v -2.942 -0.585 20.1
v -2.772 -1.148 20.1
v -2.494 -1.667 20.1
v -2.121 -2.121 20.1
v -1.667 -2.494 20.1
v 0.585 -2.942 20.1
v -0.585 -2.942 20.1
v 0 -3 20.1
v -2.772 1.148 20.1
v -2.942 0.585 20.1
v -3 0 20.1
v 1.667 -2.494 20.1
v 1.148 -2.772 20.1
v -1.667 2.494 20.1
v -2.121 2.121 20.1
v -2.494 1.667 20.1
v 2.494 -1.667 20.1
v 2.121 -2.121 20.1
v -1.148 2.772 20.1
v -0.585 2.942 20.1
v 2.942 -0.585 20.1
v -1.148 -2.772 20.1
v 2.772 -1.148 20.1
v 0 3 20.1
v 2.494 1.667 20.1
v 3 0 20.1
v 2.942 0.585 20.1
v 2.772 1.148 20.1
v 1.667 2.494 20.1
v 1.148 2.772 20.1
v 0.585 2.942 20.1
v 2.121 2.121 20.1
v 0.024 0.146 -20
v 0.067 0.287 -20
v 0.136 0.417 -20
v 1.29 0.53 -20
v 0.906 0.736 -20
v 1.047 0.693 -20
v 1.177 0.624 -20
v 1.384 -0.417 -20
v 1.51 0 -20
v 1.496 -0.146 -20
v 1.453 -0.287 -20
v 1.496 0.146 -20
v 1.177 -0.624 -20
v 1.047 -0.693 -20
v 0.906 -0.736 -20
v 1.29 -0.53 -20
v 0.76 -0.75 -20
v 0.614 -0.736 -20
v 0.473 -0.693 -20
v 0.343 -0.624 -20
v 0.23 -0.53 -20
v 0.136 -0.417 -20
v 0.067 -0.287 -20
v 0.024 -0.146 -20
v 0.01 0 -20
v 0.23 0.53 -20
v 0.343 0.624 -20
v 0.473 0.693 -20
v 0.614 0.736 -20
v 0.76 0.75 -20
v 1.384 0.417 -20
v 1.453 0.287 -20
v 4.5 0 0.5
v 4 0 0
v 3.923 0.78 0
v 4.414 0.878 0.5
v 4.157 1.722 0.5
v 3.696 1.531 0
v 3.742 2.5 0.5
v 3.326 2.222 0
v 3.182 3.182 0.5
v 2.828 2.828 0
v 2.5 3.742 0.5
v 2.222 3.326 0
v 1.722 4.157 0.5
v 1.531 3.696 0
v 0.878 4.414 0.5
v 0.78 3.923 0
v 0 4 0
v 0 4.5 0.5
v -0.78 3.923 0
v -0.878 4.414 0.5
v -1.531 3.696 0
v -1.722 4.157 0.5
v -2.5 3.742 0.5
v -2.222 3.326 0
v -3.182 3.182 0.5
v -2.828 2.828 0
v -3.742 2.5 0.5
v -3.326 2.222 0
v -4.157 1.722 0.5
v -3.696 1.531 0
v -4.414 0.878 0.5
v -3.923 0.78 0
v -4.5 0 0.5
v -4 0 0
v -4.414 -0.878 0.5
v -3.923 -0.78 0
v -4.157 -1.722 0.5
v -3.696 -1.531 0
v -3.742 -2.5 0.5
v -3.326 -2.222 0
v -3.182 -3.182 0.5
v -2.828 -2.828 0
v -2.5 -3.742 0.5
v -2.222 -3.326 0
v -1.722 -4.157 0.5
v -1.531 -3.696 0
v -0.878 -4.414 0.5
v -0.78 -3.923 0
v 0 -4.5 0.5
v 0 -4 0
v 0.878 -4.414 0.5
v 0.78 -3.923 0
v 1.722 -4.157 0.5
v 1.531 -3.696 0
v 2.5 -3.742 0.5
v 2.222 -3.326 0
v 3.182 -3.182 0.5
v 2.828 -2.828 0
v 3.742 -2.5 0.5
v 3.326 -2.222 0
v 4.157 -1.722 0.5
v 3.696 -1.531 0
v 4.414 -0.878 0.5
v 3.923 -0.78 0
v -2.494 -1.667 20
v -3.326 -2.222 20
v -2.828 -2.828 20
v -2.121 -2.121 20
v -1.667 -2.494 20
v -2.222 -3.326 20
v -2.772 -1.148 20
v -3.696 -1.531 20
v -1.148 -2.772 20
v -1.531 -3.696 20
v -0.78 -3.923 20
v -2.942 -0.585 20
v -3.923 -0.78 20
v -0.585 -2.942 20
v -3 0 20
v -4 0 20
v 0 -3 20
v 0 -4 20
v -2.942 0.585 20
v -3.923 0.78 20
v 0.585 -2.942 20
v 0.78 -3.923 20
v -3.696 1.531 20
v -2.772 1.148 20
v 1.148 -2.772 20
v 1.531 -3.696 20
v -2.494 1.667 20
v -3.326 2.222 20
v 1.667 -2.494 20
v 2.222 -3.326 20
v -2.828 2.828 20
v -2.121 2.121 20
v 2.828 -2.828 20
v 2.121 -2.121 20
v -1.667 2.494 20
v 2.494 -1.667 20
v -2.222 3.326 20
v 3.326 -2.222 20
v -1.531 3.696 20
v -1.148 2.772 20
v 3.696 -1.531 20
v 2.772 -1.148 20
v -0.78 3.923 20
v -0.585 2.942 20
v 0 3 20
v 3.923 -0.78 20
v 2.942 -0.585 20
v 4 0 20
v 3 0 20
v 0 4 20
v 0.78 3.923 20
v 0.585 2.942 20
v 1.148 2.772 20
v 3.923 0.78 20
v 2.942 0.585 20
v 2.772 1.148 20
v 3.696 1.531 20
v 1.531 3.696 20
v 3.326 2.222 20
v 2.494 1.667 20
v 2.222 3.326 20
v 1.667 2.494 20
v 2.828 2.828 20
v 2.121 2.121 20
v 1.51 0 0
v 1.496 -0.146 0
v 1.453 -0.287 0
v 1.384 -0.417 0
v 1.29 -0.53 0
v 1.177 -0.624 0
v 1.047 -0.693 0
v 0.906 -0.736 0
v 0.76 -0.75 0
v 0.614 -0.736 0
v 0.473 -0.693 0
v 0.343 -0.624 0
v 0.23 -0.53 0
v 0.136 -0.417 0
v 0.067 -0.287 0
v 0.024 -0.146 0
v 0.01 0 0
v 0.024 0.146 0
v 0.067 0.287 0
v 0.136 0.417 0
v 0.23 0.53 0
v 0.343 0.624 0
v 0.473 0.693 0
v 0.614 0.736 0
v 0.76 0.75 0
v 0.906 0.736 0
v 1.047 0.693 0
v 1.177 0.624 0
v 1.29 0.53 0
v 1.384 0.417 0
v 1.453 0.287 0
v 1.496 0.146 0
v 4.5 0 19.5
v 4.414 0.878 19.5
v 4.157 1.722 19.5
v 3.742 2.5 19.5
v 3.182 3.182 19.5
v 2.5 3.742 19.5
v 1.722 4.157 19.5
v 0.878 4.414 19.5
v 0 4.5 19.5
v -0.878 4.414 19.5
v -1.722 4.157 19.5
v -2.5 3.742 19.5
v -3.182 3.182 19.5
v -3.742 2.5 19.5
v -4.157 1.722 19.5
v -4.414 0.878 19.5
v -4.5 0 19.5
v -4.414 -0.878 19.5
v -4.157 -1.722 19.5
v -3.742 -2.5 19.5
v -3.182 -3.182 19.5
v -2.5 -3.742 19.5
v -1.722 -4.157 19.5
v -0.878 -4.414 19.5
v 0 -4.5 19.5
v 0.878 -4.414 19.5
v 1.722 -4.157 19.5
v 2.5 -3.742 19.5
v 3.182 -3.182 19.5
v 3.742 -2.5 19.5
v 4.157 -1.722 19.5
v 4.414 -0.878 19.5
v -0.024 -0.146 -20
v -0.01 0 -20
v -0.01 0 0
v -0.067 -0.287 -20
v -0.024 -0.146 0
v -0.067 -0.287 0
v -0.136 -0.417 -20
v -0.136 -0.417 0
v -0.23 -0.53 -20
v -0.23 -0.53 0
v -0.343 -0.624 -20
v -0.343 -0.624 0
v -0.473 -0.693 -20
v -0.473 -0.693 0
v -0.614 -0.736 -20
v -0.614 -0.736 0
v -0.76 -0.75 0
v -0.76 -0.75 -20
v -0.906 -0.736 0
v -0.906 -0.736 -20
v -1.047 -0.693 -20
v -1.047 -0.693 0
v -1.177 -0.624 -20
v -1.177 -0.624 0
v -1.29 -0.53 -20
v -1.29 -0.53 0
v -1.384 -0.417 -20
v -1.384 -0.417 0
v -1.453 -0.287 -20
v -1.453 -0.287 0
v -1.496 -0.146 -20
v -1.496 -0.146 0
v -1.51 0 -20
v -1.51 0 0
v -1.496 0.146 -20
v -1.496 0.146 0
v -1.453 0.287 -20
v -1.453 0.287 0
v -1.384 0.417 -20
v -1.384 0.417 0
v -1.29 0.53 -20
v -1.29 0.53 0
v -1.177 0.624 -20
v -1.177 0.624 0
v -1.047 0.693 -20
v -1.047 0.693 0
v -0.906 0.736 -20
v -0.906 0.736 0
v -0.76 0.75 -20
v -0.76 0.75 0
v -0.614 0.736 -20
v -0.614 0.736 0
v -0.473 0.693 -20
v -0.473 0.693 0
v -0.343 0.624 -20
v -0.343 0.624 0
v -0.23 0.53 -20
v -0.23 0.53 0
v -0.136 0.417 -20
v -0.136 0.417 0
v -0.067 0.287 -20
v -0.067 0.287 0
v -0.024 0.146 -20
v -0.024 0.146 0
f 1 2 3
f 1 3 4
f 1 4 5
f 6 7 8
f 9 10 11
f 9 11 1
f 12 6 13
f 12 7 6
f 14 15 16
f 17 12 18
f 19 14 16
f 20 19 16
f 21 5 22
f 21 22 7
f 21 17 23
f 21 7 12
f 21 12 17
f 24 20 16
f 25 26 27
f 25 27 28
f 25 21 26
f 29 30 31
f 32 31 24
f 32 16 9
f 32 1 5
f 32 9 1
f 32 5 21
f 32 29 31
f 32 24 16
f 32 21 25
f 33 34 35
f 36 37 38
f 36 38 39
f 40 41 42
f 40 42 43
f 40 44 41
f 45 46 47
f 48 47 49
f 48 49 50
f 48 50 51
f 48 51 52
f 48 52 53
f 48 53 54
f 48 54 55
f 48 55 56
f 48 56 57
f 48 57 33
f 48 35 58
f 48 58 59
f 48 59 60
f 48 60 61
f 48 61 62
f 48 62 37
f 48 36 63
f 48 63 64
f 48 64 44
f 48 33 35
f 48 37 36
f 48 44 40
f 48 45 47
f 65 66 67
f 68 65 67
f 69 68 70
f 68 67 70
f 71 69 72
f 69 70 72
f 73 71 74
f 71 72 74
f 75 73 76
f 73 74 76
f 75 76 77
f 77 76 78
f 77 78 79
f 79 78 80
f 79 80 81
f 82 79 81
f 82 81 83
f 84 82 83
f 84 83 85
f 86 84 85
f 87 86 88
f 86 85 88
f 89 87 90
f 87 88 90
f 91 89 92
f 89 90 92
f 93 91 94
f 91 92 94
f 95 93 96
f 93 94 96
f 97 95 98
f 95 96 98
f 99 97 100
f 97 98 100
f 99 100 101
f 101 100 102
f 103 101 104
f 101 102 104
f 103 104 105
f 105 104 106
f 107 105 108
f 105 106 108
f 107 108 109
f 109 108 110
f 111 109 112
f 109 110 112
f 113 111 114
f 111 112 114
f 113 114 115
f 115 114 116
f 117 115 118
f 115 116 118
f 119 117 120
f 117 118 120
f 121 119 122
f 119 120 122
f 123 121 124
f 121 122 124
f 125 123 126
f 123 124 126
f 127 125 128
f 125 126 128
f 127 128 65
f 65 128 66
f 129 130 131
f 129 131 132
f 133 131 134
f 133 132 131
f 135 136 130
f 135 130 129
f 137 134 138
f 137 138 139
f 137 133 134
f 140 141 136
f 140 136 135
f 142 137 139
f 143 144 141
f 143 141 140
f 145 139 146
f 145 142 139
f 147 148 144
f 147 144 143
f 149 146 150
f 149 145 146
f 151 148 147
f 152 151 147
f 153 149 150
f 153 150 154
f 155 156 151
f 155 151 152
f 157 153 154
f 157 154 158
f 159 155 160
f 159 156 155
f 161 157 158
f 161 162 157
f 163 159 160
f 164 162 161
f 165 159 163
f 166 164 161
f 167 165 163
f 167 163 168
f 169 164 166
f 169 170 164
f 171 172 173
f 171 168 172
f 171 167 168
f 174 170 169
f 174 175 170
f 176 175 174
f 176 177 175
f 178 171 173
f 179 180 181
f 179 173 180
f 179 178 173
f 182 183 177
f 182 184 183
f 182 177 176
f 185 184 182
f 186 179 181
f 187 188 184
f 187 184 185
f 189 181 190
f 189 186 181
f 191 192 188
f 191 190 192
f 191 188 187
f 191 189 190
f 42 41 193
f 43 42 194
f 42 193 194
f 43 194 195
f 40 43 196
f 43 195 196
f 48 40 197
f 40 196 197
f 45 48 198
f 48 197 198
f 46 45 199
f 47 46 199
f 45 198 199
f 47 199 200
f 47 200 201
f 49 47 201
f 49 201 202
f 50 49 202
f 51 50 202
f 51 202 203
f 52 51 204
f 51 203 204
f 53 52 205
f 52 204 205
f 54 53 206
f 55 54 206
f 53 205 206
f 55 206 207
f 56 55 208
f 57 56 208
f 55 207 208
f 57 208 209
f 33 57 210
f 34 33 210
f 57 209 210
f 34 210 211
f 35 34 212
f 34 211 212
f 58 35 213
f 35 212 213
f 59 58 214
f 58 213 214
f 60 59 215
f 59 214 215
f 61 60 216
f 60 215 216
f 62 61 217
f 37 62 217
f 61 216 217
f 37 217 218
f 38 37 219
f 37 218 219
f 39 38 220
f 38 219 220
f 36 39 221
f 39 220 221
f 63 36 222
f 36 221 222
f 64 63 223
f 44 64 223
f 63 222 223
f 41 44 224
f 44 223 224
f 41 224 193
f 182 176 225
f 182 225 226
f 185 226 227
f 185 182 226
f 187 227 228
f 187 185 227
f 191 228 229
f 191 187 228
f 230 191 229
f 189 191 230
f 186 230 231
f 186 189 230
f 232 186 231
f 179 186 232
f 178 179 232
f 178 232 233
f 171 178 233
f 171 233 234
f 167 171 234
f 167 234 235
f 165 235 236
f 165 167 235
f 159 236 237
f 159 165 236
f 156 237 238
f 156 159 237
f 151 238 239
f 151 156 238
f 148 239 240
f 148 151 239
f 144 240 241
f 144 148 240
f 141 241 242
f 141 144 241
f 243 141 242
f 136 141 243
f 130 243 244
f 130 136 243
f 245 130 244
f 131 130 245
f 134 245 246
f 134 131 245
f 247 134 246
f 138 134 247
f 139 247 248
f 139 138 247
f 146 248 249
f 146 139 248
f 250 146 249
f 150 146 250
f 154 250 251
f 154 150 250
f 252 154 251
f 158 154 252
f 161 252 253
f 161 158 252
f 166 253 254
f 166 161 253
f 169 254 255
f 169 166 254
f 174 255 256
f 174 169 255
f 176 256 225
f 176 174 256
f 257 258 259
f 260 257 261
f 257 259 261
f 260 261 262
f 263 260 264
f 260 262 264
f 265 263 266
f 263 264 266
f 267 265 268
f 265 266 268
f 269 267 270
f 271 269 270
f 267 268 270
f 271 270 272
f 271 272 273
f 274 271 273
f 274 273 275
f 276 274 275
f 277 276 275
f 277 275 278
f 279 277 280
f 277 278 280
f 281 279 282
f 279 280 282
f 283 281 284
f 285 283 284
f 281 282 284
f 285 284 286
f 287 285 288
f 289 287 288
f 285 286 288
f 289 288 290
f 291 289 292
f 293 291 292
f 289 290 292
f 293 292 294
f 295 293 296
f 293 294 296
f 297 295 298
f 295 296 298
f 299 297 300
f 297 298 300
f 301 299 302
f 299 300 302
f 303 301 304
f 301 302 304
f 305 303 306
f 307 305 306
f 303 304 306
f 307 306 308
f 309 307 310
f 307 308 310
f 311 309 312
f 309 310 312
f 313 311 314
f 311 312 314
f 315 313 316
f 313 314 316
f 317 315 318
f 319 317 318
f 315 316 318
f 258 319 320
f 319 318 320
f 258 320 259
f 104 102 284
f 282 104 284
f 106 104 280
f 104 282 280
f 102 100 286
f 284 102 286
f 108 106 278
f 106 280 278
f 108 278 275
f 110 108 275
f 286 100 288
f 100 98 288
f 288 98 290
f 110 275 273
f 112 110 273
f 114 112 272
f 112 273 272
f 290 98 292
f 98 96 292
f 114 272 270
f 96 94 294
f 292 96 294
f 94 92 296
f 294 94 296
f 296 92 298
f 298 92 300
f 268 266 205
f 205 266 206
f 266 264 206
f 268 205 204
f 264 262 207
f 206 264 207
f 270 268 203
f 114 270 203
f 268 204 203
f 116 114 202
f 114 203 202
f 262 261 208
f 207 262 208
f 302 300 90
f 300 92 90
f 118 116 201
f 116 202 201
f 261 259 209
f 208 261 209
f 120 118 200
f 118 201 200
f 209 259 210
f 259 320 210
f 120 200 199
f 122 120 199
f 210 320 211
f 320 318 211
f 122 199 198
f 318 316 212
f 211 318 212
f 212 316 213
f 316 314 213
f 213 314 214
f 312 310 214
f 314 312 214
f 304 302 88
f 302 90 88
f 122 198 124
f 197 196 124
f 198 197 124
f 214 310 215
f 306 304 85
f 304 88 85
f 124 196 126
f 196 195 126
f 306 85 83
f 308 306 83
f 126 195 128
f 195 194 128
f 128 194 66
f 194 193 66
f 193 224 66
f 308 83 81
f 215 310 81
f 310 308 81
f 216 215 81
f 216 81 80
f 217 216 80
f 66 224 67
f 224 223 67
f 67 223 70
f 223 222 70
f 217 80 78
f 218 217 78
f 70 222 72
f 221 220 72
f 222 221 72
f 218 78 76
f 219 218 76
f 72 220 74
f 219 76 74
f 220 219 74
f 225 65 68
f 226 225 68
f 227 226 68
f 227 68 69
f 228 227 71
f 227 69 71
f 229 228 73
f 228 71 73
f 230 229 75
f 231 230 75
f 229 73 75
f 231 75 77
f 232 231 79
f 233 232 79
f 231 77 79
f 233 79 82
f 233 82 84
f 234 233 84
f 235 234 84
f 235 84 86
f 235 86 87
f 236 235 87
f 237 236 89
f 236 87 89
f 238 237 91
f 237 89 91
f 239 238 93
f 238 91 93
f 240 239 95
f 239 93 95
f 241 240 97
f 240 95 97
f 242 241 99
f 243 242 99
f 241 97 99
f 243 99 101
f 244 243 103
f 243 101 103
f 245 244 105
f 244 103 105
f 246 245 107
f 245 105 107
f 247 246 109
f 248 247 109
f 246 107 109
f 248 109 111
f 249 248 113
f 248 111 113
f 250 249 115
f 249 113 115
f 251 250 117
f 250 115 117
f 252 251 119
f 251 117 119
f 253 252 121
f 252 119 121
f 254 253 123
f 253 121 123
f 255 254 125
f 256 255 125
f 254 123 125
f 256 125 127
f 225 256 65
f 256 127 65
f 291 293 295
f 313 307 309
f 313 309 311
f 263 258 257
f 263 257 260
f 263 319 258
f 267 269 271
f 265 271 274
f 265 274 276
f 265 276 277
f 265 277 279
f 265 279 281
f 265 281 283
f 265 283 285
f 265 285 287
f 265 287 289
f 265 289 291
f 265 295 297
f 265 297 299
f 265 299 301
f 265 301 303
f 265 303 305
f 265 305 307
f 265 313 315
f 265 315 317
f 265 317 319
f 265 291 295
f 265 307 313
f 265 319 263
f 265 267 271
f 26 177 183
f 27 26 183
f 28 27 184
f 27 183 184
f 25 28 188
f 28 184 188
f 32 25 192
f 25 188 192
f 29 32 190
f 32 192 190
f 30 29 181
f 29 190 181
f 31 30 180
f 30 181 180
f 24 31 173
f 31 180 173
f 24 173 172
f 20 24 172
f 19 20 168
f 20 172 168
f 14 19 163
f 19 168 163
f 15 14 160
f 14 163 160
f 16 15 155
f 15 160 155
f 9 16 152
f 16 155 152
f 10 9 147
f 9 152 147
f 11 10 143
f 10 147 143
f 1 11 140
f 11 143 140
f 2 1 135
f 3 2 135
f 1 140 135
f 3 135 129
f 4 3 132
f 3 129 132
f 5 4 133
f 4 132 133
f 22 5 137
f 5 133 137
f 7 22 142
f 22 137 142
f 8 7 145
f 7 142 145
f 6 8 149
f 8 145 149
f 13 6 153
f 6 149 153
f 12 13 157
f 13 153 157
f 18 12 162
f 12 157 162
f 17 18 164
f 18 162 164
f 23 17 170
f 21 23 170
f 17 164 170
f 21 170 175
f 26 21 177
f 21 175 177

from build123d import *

# Parameters (mm, degrees)
ESQUISSE2_R        = 4.5
BOSS_EXTRU_1_DEPTH = 20
CHANFREIN1_SIZE    = 0.5
ESQUISSE3_R        = 3
BOSS_EXTRU_4_DEPTH = 0.1
ESQUISSE5_R        = 0.75
BOSS_EXTRU_5_DEPTH = 20


with BuildPart() as part:
    # Esquisse2 → Boss.-Extru.1 (new body)
    with BuildSketch(Plane.XY):
        Circle(ESQUISSE2_R)
    extrude(amount=BOSS_EXTRU_1_DEPTH)

    # Chanfrein1
    chanfrein1_edges = [part.edges().sort_by_distance(p)[0] for p in [
        (-4.5, 0, 0),
        (-4.5, 0, 20),
    ]]
    chamfer(chanfrein1_edges, length=CHANFREIN1_SIZE)

    # Esquisse3 → Boss.-Extru.4 (add)
    with BuildSketch(Plane.XY.offset(20)):
        Circle(ESQUISSE3_R)
    extrude(amount=BOSS_EXTRU_4_DEPTH)

    # Esquisse5 → Boss.-Extru.5 (add)
    with BuildSketch(Plane(origin=(0, 0, 0), x_dir=(-1, 0, 0), z_dir=(0, 0, -1))):
        with Locations(Location((0.76, 0, 0), (0, 0, 180))):
            Circle(ESQUISSE5_R)
        with Locations(Location((-0.76, 0, 0), (0, 0, 180))):
            Circle(ESQUISSE5_R)
    extrude(amount=BOSS_EXTRU_5_DEPTH)


solid = part.part
